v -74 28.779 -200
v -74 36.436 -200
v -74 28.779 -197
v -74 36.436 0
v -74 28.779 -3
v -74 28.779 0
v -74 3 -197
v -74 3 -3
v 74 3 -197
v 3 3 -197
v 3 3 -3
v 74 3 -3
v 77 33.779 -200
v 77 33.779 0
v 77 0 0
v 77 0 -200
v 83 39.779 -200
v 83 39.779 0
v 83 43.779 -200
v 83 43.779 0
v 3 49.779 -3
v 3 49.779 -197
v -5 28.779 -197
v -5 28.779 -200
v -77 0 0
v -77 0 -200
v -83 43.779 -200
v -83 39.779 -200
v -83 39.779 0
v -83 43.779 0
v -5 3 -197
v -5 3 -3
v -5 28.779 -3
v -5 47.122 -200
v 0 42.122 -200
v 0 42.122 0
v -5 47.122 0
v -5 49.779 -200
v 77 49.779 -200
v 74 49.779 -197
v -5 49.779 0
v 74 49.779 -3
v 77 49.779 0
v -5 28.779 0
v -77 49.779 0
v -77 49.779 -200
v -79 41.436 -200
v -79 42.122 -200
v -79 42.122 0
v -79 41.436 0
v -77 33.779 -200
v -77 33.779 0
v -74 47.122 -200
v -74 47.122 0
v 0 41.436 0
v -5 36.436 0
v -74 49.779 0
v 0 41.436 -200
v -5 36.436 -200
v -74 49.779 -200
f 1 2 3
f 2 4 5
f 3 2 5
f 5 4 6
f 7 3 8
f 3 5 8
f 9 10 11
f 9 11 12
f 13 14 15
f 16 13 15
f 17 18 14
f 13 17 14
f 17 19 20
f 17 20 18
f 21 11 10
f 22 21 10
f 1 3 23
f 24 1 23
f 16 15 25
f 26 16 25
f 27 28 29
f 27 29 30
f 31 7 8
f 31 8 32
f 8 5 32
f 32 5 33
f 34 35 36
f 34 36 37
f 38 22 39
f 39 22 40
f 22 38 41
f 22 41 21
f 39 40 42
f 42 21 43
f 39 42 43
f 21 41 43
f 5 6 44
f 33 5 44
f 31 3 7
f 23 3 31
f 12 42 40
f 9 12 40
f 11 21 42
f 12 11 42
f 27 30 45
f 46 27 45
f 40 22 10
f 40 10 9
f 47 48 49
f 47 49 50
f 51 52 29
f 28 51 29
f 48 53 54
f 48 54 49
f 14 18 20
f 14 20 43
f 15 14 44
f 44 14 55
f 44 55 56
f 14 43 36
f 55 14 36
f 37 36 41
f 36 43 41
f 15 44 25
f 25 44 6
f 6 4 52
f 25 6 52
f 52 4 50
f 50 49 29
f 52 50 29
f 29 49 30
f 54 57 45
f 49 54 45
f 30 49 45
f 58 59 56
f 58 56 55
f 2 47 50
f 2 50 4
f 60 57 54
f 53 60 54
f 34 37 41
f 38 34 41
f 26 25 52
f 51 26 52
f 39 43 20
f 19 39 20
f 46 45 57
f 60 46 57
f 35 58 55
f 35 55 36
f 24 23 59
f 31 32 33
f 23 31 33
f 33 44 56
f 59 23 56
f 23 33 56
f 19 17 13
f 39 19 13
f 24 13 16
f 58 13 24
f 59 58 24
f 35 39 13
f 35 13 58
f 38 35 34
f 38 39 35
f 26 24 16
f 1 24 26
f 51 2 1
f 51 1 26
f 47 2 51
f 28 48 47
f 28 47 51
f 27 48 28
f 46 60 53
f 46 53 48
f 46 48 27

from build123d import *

# Parameters (mm, degrees)
EXTRUDE_1_DEPTH     = 200
SKETCH_2_W          = 148
SKETCH_2_H          = 194
CUT_EXTRUDE_1_DEPTH = 46.779006664
SKETCH_3_W          = 8
SKETCH_3_H          = 194
EXTRUDE_1_2_DEPTH   = 46.779006664
CUT_EXTRUDE_2_DEPTH = 223.186744664


with BuildPart() as part:
    # 草图1 → Extrude 1 (new body)
    with BuildSketch(Plane.XY):
        Polygon((77, 0), (-77, 0), (-77, 33.779006664), (-83, 39.779006664), (-83, 43.779006664), (-77, 49.779006664), (77, 49.779006664), (83, 43.779006664), (83, 39.779006664), (77, 33.779006664), align=None)
    extrude(amount=-EXTRUDE_1_DEPTH)

    # 草图2 → 切除-拉伸1 (cut)
    with BuildSketch(Plane(origin=(0, 49.779006664, 0), x_dir=(1, 0, 0), z_dir=(0, 1, 0))):
        with Locations((0, 100)):
            Rectangle(SKETCH_2_W, SKETCH_2_H)
    extrude(amount=-CUT_EXTRUDE_1_DEPTH, mode=Mode.SUBTRACT)

    # 草图3 → Extrude 1 2 (add)
    with BuildSketch(Plane(origin=(0, 3, 0), x_dir=(1, 0, 0), z_dir=(0, 1, 0))):
        with Locations((-1, 100)):
            Rectangle(SKETCH_3_W, SKETCH_3_H)
    extrude(amount=EXTRUDE_1_2_DEPTH)

    # 草图4 → 切除-拉伸2 (cut, through all)
    with BuildSketch(Plane.XY):
        Polygon((-74, 49.779006664), (-74, 47.122152414), (-79, 42.122152414), (-79, 41.435860913), (-74, 36.435860913), (-74, 28.779006664), (-5, 28.779006664), (-5, 36.435860913), (0, 41.435860913), (0, 42.122152414), (-5, 47.122152414), (-5, 49.779006664), align=None)
    extrude(amount=-CUT_EXTRUDE_2_DEPTH, mode=Mode.SUBTRACT)


solid = part.part
